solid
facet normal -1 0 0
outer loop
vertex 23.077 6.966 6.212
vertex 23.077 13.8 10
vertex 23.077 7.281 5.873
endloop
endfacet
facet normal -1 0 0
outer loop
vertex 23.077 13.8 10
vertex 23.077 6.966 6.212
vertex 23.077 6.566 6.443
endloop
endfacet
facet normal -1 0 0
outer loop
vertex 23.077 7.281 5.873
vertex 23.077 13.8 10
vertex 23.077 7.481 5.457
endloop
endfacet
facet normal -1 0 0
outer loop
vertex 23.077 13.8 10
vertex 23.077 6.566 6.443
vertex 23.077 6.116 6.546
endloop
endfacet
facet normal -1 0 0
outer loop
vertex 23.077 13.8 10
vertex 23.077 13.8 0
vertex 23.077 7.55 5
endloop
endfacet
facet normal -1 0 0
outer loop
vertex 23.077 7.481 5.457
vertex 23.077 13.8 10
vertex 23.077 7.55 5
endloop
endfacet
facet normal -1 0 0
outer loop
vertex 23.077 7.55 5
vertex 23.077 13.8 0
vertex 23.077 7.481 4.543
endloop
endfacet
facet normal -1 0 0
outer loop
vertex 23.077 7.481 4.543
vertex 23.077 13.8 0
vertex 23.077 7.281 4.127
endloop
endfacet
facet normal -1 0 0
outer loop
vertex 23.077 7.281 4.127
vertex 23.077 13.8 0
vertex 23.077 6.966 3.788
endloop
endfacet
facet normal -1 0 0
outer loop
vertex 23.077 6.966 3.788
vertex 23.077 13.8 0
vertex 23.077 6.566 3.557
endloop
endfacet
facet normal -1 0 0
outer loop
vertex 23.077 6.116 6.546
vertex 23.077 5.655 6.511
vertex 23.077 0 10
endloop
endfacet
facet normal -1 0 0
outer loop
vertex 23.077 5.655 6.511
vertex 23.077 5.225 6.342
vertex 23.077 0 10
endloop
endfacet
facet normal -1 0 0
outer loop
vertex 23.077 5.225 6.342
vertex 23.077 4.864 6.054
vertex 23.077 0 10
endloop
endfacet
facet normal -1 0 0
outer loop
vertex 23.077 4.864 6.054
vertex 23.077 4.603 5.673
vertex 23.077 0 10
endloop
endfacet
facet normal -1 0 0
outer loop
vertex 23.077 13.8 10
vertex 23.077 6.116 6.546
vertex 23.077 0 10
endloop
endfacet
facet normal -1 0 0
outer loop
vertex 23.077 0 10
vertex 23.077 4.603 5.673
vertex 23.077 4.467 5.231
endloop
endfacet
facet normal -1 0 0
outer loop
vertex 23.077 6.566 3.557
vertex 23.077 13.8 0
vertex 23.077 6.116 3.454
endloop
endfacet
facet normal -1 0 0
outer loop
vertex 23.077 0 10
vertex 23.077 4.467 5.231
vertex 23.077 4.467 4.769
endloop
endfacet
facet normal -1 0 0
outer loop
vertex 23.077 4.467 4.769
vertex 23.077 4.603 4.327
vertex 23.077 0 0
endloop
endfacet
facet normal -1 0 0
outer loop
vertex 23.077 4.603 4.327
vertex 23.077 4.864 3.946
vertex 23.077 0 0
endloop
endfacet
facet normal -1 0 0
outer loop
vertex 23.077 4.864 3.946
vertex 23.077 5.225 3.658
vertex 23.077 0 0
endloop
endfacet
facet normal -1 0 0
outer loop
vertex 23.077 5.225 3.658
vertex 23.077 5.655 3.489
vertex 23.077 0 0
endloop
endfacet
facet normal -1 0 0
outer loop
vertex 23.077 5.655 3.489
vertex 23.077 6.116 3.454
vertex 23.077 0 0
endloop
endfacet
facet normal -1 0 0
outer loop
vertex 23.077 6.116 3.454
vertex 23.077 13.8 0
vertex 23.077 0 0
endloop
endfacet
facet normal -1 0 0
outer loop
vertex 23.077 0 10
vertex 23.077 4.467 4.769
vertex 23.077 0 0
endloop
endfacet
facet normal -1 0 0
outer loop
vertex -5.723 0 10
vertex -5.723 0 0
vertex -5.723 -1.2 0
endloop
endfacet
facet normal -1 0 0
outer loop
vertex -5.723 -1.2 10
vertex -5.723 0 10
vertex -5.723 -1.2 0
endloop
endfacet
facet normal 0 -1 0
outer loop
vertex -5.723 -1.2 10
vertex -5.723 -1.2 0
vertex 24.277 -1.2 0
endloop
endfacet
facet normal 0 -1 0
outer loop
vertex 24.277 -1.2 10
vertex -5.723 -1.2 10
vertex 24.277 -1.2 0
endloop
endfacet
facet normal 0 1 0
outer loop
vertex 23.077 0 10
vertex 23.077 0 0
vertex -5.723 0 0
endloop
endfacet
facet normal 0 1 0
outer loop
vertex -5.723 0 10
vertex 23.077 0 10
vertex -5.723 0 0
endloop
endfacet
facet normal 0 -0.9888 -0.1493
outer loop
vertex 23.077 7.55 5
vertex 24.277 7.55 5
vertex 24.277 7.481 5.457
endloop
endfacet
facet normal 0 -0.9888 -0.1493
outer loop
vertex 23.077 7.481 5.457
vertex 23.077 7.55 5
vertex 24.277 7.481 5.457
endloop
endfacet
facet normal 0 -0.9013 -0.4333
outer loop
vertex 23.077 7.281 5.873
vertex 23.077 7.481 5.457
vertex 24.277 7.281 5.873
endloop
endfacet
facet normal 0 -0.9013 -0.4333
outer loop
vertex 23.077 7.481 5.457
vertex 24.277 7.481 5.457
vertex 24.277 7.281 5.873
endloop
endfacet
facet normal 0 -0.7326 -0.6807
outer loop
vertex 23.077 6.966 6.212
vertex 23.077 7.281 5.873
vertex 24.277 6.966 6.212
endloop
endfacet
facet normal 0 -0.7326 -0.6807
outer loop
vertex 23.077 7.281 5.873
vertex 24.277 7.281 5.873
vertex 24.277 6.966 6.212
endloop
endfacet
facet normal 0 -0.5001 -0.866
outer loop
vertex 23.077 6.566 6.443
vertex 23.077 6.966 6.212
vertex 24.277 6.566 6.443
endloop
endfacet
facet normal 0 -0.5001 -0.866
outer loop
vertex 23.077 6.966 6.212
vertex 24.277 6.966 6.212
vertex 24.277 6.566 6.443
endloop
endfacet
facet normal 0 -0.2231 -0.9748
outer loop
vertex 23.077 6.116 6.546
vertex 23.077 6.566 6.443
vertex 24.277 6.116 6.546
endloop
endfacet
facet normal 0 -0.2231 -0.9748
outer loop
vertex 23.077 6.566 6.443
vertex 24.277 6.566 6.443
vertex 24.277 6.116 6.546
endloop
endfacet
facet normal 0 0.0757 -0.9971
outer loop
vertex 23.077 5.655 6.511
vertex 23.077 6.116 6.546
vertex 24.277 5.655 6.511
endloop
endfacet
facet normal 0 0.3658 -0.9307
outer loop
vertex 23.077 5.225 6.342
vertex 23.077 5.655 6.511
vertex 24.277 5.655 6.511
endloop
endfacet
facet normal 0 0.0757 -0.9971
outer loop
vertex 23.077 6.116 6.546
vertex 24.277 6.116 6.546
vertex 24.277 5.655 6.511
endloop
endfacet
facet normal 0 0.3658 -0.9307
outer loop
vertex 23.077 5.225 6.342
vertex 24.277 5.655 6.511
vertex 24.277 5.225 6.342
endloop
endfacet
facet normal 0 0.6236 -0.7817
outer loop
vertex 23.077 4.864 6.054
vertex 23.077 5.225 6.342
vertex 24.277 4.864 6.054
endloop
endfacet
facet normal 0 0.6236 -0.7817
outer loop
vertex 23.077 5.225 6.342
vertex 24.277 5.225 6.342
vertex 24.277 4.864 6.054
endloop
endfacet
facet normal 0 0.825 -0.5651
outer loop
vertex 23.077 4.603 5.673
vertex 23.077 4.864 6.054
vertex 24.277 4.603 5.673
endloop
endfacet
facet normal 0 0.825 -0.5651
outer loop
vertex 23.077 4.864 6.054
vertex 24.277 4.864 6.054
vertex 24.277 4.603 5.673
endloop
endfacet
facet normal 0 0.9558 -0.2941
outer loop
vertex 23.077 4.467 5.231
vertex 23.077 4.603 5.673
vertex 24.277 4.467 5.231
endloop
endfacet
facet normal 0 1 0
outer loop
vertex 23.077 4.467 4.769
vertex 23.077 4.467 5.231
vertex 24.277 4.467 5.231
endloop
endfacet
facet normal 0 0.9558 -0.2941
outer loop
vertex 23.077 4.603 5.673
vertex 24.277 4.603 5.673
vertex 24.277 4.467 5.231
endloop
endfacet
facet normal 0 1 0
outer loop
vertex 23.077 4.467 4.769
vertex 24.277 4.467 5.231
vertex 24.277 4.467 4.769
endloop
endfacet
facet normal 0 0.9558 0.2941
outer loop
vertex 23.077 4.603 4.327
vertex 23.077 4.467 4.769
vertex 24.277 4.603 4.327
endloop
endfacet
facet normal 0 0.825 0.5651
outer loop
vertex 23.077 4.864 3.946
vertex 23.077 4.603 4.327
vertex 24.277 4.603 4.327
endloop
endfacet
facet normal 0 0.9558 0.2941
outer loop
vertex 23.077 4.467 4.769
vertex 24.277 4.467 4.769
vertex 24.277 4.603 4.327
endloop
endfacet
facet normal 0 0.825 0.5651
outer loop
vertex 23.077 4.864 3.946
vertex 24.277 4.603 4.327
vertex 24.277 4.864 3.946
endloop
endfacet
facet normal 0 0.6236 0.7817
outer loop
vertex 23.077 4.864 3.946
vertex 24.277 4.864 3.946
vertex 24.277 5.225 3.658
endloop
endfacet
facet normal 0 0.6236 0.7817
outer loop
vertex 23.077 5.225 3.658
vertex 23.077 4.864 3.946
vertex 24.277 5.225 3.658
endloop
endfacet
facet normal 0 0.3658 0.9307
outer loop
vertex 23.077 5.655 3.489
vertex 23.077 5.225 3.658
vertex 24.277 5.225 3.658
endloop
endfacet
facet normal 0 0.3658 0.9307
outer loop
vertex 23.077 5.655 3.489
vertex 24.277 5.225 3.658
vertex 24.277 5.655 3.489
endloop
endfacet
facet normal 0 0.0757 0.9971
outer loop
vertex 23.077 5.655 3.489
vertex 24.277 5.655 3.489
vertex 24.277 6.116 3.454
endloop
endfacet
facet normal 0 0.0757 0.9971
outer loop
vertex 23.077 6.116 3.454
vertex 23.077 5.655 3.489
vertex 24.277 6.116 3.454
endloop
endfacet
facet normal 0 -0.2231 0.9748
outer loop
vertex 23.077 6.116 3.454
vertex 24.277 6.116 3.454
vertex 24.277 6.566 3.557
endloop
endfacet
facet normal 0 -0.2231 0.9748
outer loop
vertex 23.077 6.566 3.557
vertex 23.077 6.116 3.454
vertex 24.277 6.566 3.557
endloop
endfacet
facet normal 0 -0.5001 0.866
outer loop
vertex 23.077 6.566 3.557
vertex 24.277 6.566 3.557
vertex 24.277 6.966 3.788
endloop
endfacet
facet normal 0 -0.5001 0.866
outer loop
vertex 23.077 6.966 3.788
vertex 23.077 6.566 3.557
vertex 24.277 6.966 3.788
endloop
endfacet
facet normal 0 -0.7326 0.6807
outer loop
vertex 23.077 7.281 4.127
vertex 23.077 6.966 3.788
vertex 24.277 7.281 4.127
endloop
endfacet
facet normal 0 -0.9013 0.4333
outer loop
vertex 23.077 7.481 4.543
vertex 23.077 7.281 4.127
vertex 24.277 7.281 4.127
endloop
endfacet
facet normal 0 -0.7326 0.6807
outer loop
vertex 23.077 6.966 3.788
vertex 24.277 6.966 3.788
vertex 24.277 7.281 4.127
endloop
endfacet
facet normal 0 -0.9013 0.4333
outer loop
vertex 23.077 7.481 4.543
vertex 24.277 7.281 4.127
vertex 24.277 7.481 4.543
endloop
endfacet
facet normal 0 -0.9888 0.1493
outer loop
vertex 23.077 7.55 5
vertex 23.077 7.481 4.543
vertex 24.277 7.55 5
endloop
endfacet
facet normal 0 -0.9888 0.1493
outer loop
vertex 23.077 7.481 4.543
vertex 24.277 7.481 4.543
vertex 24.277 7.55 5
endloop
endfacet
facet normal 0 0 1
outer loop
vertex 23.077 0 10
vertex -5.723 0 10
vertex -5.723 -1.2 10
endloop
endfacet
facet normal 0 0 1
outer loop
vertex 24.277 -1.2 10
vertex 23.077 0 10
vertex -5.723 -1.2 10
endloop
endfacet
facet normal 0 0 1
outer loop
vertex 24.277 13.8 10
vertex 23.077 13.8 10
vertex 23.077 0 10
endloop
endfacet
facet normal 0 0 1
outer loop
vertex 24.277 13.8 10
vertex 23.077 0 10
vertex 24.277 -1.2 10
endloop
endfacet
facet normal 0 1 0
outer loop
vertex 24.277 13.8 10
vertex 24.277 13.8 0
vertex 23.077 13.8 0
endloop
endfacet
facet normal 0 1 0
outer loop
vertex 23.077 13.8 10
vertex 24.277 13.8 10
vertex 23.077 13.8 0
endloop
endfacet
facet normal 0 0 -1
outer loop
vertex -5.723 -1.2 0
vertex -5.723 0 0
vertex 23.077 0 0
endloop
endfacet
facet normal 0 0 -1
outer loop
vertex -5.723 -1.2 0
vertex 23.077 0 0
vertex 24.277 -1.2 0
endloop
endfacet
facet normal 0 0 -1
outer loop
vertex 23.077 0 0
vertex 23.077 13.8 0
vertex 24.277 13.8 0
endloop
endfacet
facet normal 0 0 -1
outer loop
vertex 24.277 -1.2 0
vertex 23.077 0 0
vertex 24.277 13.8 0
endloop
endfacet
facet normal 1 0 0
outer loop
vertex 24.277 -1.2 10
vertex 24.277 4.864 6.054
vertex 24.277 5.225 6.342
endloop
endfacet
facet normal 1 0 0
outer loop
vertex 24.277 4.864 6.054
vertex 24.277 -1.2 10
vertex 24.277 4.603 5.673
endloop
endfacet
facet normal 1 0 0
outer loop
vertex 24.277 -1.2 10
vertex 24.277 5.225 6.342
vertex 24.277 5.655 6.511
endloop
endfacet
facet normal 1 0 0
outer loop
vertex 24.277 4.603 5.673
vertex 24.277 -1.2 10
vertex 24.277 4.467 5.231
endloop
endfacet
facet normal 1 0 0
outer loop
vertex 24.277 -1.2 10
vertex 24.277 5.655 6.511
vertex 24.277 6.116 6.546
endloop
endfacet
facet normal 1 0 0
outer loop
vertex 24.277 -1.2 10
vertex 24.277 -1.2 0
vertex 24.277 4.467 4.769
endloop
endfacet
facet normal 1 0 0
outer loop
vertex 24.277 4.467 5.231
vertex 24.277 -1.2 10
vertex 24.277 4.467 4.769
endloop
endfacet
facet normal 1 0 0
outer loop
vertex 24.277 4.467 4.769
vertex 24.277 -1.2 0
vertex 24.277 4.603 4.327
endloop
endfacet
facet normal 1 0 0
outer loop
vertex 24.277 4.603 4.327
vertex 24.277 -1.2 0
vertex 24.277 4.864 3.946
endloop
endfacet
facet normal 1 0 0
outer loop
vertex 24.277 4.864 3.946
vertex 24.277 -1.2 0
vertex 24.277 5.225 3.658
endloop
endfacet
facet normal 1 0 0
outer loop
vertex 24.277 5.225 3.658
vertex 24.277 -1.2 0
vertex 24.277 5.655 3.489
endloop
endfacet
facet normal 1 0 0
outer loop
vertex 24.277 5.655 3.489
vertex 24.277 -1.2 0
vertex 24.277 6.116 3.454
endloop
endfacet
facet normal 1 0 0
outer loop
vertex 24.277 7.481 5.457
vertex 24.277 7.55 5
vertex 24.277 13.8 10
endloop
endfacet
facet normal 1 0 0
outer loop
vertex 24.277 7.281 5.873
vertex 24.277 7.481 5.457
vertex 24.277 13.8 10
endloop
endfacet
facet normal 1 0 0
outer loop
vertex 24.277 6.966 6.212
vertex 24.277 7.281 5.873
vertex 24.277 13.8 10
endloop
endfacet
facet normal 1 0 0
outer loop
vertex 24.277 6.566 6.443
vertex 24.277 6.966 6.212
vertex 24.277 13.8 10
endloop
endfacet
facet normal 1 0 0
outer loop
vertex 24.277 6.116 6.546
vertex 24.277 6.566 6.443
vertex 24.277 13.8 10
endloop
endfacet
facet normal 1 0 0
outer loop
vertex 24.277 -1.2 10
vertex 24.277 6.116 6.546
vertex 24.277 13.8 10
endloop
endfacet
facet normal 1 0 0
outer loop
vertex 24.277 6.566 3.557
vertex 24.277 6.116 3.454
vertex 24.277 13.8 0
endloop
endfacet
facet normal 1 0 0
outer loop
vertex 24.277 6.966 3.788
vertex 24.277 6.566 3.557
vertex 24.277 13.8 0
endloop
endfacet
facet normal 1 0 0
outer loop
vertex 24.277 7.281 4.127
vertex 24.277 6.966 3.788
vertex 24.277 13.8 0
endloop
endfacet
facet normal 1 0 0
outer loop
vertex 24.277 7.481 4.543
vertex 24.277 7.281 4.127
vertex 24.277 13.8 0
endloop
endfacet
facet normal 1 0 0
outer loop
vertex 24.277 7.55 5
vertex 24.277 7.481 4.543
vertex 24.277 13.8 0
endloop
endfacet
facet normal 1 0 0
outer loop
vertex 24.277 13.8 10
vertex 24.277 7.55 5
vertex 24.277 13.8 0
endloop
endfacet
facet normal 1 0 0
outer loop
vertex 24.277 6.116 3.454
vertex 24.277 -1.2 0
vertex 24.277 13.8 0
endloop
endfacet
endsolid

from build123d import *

# Parameters (mm, degrees)
F1_DEPTH = 10
F2_R     = 1.55
F3_DEPTH = 1.2


with BuildPart() as f1:
    # F0 (on Top) → F1 (new body)
    with BuildSketch(Plane.XY):
        Polygon((23.076923, 0), (-5.723077, 0), (-5.723077, -1.2), (24.276923, -1.2), (24.276923, 13.8), (23.076923, 13.8), align=None)
    extrude(amount=F1_DEPTH)

    # F2 (on face) → F3 (cut)
    with BuildSketch(Plane.YZ.offset(24.276923)):
        with Locations((6, 5)):
            Circle(F2_R)
    extrude(amount=-F3_DEPTH, mode=Mode.SUBTRACT)


solid = f1.part
